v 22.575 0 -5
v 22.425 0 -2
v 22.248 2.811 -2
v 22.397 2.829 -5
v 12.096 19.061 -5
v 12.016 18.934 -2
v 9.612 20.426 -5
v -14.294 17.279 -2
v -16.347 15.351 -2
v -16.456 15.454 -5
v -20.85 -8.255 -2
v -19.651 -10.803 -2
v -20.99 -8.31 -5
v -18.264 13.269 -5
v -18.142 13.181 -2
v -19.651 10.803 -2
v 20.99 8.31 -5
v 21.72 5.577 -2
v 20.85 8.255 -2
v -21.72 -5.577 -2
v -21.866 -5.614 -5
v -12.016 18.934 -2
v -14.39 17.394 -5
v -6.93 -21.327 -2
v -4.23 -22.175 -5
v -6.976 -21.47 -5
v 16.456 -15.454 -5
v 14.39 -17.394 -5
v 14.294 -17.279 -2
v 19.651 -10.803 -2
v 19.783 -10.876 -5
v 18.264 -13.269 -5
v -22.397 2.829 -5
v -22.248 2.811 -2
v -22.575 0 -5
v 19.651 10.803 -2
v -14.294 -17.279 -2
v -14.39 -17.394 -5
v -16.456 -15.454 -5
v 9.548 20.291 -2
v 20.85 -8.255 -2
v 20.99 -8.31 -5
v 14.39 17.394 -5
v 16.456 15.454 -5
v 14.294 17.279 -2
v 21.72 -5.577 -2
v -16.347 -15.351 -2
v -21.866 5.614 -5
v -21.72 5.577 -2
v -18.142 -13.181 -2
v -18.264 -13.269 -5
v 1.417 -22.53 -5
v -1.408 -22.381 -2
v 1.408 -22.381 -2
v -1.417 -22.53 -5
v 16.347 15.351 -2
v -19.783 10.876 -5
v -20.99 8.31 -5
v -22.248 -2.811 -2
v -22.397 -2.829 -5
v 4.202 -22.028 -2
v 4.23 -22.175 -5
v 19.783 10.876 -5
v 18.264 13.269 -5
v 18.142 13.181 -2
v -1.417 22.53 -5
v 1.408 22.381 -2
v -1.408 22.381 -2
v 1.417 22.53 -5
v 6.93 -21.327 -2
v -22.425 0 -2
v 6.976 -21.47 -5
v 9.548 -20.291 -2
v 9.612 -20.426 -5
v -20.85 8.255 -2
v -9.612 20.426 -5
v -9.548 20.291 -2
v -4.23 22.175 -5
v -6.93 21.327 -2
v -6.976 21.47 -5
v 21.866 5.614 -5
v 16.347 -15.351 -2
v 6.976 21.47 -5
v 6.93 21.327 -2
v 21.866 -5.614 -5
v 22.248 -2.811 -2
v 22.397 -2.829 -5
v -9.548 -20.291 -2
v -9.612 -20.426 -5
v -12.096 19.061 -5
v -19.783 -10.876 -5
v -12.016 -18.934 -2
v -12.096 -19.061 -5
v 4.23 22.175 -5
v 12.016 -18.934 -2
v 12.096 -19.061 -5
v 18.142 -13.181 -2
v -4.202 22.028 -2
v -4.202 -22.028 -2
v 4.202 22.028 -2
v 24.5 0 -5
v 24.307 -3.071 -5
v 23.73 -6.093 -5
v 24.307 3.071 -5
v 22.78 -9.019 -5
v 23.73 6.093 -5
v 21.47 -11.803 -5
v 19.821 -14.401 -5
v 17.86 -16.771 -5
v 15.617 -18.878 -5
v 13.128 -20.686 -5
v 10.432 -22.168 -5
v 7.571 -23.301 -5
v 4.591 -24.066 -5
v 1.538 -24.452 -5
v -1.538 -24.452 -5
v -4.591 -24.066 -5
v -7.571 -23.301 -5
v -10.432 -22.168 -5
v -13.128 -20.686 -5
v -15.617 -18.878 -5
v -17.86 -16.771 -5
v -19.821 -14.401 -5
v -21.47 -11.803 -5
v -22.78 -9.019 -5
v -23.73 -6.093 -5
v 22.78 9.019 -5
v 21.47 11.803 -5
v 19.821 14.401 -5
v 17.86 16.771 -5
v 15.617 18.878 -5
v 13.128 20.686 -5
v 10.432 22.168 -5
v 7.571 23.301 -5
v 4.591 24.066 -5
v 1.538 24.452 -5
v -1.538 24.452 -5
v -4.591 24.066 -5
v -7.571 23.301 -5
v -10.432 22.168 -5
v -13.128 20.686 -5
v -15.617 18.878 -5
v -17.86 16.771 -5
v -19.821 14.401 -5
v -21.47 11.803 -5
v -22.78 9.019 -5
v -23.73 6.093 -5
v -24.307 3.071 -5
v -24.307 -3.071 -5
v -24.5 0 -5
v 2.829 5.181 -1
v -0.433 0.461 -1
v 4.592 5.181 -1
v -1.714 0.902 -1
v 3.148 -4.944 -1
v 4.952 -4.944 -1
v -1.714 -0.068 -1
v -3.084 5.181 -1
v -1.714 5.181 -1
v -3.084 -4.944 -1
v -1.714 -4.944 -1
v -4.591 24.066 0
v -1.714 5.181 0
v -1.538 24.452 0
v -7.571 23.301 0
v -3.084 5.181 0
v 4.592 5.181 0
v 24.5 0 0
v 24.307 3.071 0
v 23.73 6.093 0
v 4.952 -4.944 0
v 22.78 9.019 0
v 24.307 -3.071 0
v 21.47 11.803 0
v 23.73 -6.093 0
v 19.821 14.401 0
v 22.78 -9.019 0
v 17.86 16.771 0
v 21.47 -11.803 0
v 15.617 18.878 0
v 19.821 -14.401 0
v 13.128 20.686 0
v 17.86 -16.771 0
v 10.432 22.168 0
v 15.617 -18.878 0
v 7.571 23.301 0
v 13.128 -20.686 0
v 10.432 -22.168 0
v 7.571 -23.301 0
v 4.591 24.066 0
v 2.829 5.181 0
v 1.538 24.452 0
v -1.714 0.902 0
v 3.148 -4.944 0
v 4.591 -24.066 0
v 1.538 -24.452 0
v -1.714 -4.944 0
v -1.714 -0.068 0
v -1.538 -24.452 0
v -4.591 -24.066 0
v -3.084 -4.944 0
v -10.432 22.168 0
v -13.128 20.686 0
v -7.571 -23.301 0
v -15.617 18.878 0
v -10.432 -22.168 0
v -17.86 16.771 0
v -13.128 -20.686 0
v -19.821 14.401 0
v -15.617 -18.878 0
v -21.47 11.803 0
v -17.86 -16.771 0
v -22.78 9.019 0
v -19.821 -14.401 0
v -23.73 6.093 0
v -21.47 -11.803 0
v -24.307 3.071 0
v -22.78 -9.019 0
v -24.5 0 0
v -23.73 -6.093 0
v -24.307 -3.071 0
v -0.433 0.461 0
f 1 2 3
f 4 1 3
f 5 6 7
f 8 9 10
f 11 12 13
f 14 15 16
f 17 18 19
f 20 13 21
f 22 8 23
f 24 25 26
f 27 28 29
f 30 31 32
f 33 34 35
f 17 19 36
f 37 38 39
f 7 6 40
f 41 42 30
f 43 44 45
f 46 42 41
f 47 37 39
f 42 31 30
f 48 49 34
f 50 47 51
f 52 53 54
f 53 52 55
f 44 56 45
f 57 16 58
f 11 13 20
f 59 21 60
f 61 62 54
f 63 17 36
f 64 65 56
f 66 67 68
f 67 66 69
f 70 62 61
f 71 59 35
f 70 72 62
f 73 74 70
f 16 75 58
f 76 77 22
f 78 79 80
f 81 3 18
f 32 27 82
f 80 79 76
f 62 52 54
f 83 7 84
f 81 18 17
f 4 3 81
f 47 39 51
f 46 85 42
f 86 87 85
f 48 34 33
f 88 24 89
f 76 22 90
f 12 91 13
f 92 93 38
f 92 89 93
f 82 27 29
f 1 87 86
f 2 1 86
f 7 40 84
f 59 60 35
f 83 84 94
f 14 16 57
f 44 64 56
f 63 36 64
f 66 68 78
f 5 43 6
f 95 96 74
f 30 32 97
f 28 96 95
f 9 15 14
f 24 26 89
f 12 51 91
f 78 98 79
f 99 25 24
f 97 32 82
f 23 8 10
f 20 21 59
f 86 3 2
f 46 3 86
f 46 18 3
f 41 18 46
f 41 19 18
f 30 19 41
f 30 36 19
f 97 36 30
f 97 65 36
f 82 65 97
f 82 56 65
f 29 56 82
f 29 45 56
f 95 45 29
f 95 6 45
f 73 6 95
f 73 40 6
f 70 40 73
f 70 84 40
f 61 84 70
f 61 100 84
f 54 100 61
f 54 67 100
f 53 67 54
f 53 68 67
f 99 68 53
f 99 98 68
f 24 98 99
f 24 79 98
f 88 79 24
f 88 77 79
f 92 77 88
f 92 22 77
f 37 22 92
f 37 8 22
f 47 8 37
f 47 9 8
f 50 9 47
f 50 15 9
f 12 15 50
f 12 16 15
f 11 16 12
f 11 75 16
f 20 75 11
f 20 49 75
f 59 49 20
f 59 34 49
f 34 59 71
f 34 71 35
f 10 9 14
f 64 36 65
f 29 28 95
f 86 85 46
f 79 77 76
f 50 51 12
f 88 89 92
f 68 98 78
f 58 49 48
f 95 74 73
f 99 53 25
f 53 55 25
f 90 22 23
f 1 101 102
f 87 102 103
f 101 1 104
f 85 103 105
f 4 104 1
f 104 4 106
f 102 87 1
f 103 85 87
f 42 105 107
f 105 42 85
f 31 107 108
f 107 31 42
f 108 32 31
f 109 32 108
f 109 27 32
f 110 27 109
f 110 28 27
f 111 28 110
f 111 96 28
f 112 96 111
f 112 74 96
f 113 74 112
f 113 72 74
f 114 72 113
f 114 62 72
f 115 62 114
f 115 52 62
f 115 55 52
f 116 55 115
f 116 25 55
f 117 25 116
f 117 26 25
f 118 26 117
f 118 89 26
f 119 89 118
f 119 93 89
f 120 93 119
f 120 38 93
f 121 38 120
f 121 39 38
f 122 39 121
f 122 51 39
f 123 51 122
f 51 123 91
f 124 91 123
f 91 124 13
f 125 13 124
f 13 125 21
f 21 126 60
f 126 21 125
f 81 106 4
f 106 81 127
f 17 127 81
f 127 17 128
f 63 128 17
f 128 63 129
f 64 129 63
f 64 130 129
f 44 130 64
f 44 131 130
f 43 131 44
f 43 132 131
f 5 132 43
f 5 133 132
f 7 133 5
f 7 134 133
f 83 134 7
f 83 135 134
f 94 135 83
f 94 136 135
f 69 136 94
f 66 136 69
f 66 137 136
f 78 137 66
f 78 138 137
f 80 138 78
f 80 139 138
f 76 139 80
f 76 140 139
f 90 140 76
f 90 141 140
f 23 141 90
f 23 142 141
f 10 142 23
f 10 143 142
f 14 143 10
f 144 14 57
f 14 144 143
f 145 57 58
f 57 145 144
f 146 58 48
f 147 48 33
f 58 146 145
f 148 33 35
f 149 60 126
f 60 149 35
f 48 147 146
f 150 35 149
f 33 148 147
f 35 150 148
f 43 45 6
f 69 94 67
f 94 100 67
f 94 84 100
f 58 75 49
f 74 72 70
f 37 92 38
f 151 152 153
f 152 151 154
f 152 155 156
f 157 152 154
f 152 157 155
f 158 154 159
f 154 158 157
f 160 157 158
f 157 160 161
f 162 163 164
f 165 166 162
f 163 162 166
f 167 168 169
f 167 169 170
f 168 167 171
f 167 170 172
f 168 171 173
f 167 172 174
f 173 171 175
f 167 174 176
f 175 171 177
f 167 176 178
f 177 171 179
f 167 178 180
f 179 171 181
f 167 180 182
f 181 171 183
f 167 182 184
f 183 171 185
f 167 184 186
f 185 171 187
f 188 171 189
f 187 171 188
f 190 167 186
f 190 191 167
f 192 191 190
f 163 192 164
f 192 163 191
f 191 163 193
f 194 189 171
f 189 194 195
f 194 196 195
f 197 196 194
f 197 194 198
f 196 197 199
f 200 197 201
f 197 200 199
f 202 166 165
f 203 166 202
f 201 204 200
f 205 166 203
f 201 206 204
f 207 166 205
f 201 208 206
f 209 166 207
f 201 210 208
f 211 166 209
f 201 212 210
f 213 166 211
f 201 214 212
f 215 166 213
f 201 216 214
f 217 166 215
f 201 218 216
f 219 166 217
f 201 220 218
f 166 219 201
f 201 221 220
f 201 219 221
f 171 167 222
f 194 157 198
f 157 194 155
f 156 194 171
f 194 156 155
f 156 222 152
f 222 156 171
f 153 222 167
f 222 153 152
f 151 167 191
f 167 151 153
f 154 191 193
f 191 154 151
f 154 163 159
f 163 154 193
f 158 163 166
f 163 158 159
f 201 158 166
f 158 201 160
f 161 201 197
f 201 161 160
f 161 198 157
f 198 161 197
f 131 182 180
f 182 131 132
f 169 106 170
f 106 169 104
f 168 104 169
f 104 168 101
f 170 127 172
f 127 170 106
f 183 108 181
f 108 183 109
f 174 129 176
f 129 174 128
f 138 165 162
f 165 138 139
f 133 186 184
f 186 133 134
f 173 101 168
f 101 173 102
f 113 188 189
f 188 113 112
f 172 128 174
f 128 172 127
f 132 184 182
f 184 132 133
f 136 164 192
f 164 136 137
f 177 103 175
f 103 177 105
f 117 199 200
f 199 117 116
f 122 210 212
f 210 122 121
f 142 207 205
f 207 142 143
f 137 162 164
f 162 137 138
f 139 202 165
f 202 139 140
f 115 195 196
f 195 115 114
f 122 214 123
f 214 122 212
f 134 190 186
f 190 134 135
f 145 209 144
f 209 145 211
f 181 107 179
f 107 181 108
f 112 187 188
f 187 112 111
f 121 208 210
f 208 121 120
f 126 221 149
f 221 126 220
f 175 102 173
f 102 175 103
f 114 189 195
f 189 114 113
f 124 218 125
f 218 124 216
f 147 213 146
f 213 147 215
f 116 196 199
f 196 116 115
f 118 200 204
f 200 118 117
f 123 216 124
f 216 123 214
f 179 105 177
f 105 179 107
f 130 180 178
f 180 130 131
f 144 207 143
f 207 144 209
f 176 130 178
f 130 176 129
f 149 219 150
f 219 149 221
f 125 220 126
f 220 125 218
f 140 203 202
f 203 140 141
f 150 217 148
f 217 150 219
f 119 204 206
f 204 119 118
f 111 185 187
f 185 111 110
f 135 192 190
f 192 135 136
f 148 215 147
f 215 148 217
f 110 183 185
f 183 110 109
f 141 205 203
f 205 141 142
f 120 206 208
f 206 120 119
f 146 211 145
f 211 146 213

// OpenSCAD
$fn = 50;

difference() {
	union() {
		translate(v = [0, 0, -5.0]) {
			cylinder(h = 5, r = 24.5);
		}
	}
	union() {
		#translate(v = [0, 0, -5.0]) {
			cylinder(h = 3, r1 = 22.575, r2 = 22.425);
		}
		translate(v = [0, 0, -1]) {
			linear_extrude(height = 1) {
				text(font = "Impact", halign = "center", size = 10, text = "K", valign = "center");
			}
		}
	}
}
